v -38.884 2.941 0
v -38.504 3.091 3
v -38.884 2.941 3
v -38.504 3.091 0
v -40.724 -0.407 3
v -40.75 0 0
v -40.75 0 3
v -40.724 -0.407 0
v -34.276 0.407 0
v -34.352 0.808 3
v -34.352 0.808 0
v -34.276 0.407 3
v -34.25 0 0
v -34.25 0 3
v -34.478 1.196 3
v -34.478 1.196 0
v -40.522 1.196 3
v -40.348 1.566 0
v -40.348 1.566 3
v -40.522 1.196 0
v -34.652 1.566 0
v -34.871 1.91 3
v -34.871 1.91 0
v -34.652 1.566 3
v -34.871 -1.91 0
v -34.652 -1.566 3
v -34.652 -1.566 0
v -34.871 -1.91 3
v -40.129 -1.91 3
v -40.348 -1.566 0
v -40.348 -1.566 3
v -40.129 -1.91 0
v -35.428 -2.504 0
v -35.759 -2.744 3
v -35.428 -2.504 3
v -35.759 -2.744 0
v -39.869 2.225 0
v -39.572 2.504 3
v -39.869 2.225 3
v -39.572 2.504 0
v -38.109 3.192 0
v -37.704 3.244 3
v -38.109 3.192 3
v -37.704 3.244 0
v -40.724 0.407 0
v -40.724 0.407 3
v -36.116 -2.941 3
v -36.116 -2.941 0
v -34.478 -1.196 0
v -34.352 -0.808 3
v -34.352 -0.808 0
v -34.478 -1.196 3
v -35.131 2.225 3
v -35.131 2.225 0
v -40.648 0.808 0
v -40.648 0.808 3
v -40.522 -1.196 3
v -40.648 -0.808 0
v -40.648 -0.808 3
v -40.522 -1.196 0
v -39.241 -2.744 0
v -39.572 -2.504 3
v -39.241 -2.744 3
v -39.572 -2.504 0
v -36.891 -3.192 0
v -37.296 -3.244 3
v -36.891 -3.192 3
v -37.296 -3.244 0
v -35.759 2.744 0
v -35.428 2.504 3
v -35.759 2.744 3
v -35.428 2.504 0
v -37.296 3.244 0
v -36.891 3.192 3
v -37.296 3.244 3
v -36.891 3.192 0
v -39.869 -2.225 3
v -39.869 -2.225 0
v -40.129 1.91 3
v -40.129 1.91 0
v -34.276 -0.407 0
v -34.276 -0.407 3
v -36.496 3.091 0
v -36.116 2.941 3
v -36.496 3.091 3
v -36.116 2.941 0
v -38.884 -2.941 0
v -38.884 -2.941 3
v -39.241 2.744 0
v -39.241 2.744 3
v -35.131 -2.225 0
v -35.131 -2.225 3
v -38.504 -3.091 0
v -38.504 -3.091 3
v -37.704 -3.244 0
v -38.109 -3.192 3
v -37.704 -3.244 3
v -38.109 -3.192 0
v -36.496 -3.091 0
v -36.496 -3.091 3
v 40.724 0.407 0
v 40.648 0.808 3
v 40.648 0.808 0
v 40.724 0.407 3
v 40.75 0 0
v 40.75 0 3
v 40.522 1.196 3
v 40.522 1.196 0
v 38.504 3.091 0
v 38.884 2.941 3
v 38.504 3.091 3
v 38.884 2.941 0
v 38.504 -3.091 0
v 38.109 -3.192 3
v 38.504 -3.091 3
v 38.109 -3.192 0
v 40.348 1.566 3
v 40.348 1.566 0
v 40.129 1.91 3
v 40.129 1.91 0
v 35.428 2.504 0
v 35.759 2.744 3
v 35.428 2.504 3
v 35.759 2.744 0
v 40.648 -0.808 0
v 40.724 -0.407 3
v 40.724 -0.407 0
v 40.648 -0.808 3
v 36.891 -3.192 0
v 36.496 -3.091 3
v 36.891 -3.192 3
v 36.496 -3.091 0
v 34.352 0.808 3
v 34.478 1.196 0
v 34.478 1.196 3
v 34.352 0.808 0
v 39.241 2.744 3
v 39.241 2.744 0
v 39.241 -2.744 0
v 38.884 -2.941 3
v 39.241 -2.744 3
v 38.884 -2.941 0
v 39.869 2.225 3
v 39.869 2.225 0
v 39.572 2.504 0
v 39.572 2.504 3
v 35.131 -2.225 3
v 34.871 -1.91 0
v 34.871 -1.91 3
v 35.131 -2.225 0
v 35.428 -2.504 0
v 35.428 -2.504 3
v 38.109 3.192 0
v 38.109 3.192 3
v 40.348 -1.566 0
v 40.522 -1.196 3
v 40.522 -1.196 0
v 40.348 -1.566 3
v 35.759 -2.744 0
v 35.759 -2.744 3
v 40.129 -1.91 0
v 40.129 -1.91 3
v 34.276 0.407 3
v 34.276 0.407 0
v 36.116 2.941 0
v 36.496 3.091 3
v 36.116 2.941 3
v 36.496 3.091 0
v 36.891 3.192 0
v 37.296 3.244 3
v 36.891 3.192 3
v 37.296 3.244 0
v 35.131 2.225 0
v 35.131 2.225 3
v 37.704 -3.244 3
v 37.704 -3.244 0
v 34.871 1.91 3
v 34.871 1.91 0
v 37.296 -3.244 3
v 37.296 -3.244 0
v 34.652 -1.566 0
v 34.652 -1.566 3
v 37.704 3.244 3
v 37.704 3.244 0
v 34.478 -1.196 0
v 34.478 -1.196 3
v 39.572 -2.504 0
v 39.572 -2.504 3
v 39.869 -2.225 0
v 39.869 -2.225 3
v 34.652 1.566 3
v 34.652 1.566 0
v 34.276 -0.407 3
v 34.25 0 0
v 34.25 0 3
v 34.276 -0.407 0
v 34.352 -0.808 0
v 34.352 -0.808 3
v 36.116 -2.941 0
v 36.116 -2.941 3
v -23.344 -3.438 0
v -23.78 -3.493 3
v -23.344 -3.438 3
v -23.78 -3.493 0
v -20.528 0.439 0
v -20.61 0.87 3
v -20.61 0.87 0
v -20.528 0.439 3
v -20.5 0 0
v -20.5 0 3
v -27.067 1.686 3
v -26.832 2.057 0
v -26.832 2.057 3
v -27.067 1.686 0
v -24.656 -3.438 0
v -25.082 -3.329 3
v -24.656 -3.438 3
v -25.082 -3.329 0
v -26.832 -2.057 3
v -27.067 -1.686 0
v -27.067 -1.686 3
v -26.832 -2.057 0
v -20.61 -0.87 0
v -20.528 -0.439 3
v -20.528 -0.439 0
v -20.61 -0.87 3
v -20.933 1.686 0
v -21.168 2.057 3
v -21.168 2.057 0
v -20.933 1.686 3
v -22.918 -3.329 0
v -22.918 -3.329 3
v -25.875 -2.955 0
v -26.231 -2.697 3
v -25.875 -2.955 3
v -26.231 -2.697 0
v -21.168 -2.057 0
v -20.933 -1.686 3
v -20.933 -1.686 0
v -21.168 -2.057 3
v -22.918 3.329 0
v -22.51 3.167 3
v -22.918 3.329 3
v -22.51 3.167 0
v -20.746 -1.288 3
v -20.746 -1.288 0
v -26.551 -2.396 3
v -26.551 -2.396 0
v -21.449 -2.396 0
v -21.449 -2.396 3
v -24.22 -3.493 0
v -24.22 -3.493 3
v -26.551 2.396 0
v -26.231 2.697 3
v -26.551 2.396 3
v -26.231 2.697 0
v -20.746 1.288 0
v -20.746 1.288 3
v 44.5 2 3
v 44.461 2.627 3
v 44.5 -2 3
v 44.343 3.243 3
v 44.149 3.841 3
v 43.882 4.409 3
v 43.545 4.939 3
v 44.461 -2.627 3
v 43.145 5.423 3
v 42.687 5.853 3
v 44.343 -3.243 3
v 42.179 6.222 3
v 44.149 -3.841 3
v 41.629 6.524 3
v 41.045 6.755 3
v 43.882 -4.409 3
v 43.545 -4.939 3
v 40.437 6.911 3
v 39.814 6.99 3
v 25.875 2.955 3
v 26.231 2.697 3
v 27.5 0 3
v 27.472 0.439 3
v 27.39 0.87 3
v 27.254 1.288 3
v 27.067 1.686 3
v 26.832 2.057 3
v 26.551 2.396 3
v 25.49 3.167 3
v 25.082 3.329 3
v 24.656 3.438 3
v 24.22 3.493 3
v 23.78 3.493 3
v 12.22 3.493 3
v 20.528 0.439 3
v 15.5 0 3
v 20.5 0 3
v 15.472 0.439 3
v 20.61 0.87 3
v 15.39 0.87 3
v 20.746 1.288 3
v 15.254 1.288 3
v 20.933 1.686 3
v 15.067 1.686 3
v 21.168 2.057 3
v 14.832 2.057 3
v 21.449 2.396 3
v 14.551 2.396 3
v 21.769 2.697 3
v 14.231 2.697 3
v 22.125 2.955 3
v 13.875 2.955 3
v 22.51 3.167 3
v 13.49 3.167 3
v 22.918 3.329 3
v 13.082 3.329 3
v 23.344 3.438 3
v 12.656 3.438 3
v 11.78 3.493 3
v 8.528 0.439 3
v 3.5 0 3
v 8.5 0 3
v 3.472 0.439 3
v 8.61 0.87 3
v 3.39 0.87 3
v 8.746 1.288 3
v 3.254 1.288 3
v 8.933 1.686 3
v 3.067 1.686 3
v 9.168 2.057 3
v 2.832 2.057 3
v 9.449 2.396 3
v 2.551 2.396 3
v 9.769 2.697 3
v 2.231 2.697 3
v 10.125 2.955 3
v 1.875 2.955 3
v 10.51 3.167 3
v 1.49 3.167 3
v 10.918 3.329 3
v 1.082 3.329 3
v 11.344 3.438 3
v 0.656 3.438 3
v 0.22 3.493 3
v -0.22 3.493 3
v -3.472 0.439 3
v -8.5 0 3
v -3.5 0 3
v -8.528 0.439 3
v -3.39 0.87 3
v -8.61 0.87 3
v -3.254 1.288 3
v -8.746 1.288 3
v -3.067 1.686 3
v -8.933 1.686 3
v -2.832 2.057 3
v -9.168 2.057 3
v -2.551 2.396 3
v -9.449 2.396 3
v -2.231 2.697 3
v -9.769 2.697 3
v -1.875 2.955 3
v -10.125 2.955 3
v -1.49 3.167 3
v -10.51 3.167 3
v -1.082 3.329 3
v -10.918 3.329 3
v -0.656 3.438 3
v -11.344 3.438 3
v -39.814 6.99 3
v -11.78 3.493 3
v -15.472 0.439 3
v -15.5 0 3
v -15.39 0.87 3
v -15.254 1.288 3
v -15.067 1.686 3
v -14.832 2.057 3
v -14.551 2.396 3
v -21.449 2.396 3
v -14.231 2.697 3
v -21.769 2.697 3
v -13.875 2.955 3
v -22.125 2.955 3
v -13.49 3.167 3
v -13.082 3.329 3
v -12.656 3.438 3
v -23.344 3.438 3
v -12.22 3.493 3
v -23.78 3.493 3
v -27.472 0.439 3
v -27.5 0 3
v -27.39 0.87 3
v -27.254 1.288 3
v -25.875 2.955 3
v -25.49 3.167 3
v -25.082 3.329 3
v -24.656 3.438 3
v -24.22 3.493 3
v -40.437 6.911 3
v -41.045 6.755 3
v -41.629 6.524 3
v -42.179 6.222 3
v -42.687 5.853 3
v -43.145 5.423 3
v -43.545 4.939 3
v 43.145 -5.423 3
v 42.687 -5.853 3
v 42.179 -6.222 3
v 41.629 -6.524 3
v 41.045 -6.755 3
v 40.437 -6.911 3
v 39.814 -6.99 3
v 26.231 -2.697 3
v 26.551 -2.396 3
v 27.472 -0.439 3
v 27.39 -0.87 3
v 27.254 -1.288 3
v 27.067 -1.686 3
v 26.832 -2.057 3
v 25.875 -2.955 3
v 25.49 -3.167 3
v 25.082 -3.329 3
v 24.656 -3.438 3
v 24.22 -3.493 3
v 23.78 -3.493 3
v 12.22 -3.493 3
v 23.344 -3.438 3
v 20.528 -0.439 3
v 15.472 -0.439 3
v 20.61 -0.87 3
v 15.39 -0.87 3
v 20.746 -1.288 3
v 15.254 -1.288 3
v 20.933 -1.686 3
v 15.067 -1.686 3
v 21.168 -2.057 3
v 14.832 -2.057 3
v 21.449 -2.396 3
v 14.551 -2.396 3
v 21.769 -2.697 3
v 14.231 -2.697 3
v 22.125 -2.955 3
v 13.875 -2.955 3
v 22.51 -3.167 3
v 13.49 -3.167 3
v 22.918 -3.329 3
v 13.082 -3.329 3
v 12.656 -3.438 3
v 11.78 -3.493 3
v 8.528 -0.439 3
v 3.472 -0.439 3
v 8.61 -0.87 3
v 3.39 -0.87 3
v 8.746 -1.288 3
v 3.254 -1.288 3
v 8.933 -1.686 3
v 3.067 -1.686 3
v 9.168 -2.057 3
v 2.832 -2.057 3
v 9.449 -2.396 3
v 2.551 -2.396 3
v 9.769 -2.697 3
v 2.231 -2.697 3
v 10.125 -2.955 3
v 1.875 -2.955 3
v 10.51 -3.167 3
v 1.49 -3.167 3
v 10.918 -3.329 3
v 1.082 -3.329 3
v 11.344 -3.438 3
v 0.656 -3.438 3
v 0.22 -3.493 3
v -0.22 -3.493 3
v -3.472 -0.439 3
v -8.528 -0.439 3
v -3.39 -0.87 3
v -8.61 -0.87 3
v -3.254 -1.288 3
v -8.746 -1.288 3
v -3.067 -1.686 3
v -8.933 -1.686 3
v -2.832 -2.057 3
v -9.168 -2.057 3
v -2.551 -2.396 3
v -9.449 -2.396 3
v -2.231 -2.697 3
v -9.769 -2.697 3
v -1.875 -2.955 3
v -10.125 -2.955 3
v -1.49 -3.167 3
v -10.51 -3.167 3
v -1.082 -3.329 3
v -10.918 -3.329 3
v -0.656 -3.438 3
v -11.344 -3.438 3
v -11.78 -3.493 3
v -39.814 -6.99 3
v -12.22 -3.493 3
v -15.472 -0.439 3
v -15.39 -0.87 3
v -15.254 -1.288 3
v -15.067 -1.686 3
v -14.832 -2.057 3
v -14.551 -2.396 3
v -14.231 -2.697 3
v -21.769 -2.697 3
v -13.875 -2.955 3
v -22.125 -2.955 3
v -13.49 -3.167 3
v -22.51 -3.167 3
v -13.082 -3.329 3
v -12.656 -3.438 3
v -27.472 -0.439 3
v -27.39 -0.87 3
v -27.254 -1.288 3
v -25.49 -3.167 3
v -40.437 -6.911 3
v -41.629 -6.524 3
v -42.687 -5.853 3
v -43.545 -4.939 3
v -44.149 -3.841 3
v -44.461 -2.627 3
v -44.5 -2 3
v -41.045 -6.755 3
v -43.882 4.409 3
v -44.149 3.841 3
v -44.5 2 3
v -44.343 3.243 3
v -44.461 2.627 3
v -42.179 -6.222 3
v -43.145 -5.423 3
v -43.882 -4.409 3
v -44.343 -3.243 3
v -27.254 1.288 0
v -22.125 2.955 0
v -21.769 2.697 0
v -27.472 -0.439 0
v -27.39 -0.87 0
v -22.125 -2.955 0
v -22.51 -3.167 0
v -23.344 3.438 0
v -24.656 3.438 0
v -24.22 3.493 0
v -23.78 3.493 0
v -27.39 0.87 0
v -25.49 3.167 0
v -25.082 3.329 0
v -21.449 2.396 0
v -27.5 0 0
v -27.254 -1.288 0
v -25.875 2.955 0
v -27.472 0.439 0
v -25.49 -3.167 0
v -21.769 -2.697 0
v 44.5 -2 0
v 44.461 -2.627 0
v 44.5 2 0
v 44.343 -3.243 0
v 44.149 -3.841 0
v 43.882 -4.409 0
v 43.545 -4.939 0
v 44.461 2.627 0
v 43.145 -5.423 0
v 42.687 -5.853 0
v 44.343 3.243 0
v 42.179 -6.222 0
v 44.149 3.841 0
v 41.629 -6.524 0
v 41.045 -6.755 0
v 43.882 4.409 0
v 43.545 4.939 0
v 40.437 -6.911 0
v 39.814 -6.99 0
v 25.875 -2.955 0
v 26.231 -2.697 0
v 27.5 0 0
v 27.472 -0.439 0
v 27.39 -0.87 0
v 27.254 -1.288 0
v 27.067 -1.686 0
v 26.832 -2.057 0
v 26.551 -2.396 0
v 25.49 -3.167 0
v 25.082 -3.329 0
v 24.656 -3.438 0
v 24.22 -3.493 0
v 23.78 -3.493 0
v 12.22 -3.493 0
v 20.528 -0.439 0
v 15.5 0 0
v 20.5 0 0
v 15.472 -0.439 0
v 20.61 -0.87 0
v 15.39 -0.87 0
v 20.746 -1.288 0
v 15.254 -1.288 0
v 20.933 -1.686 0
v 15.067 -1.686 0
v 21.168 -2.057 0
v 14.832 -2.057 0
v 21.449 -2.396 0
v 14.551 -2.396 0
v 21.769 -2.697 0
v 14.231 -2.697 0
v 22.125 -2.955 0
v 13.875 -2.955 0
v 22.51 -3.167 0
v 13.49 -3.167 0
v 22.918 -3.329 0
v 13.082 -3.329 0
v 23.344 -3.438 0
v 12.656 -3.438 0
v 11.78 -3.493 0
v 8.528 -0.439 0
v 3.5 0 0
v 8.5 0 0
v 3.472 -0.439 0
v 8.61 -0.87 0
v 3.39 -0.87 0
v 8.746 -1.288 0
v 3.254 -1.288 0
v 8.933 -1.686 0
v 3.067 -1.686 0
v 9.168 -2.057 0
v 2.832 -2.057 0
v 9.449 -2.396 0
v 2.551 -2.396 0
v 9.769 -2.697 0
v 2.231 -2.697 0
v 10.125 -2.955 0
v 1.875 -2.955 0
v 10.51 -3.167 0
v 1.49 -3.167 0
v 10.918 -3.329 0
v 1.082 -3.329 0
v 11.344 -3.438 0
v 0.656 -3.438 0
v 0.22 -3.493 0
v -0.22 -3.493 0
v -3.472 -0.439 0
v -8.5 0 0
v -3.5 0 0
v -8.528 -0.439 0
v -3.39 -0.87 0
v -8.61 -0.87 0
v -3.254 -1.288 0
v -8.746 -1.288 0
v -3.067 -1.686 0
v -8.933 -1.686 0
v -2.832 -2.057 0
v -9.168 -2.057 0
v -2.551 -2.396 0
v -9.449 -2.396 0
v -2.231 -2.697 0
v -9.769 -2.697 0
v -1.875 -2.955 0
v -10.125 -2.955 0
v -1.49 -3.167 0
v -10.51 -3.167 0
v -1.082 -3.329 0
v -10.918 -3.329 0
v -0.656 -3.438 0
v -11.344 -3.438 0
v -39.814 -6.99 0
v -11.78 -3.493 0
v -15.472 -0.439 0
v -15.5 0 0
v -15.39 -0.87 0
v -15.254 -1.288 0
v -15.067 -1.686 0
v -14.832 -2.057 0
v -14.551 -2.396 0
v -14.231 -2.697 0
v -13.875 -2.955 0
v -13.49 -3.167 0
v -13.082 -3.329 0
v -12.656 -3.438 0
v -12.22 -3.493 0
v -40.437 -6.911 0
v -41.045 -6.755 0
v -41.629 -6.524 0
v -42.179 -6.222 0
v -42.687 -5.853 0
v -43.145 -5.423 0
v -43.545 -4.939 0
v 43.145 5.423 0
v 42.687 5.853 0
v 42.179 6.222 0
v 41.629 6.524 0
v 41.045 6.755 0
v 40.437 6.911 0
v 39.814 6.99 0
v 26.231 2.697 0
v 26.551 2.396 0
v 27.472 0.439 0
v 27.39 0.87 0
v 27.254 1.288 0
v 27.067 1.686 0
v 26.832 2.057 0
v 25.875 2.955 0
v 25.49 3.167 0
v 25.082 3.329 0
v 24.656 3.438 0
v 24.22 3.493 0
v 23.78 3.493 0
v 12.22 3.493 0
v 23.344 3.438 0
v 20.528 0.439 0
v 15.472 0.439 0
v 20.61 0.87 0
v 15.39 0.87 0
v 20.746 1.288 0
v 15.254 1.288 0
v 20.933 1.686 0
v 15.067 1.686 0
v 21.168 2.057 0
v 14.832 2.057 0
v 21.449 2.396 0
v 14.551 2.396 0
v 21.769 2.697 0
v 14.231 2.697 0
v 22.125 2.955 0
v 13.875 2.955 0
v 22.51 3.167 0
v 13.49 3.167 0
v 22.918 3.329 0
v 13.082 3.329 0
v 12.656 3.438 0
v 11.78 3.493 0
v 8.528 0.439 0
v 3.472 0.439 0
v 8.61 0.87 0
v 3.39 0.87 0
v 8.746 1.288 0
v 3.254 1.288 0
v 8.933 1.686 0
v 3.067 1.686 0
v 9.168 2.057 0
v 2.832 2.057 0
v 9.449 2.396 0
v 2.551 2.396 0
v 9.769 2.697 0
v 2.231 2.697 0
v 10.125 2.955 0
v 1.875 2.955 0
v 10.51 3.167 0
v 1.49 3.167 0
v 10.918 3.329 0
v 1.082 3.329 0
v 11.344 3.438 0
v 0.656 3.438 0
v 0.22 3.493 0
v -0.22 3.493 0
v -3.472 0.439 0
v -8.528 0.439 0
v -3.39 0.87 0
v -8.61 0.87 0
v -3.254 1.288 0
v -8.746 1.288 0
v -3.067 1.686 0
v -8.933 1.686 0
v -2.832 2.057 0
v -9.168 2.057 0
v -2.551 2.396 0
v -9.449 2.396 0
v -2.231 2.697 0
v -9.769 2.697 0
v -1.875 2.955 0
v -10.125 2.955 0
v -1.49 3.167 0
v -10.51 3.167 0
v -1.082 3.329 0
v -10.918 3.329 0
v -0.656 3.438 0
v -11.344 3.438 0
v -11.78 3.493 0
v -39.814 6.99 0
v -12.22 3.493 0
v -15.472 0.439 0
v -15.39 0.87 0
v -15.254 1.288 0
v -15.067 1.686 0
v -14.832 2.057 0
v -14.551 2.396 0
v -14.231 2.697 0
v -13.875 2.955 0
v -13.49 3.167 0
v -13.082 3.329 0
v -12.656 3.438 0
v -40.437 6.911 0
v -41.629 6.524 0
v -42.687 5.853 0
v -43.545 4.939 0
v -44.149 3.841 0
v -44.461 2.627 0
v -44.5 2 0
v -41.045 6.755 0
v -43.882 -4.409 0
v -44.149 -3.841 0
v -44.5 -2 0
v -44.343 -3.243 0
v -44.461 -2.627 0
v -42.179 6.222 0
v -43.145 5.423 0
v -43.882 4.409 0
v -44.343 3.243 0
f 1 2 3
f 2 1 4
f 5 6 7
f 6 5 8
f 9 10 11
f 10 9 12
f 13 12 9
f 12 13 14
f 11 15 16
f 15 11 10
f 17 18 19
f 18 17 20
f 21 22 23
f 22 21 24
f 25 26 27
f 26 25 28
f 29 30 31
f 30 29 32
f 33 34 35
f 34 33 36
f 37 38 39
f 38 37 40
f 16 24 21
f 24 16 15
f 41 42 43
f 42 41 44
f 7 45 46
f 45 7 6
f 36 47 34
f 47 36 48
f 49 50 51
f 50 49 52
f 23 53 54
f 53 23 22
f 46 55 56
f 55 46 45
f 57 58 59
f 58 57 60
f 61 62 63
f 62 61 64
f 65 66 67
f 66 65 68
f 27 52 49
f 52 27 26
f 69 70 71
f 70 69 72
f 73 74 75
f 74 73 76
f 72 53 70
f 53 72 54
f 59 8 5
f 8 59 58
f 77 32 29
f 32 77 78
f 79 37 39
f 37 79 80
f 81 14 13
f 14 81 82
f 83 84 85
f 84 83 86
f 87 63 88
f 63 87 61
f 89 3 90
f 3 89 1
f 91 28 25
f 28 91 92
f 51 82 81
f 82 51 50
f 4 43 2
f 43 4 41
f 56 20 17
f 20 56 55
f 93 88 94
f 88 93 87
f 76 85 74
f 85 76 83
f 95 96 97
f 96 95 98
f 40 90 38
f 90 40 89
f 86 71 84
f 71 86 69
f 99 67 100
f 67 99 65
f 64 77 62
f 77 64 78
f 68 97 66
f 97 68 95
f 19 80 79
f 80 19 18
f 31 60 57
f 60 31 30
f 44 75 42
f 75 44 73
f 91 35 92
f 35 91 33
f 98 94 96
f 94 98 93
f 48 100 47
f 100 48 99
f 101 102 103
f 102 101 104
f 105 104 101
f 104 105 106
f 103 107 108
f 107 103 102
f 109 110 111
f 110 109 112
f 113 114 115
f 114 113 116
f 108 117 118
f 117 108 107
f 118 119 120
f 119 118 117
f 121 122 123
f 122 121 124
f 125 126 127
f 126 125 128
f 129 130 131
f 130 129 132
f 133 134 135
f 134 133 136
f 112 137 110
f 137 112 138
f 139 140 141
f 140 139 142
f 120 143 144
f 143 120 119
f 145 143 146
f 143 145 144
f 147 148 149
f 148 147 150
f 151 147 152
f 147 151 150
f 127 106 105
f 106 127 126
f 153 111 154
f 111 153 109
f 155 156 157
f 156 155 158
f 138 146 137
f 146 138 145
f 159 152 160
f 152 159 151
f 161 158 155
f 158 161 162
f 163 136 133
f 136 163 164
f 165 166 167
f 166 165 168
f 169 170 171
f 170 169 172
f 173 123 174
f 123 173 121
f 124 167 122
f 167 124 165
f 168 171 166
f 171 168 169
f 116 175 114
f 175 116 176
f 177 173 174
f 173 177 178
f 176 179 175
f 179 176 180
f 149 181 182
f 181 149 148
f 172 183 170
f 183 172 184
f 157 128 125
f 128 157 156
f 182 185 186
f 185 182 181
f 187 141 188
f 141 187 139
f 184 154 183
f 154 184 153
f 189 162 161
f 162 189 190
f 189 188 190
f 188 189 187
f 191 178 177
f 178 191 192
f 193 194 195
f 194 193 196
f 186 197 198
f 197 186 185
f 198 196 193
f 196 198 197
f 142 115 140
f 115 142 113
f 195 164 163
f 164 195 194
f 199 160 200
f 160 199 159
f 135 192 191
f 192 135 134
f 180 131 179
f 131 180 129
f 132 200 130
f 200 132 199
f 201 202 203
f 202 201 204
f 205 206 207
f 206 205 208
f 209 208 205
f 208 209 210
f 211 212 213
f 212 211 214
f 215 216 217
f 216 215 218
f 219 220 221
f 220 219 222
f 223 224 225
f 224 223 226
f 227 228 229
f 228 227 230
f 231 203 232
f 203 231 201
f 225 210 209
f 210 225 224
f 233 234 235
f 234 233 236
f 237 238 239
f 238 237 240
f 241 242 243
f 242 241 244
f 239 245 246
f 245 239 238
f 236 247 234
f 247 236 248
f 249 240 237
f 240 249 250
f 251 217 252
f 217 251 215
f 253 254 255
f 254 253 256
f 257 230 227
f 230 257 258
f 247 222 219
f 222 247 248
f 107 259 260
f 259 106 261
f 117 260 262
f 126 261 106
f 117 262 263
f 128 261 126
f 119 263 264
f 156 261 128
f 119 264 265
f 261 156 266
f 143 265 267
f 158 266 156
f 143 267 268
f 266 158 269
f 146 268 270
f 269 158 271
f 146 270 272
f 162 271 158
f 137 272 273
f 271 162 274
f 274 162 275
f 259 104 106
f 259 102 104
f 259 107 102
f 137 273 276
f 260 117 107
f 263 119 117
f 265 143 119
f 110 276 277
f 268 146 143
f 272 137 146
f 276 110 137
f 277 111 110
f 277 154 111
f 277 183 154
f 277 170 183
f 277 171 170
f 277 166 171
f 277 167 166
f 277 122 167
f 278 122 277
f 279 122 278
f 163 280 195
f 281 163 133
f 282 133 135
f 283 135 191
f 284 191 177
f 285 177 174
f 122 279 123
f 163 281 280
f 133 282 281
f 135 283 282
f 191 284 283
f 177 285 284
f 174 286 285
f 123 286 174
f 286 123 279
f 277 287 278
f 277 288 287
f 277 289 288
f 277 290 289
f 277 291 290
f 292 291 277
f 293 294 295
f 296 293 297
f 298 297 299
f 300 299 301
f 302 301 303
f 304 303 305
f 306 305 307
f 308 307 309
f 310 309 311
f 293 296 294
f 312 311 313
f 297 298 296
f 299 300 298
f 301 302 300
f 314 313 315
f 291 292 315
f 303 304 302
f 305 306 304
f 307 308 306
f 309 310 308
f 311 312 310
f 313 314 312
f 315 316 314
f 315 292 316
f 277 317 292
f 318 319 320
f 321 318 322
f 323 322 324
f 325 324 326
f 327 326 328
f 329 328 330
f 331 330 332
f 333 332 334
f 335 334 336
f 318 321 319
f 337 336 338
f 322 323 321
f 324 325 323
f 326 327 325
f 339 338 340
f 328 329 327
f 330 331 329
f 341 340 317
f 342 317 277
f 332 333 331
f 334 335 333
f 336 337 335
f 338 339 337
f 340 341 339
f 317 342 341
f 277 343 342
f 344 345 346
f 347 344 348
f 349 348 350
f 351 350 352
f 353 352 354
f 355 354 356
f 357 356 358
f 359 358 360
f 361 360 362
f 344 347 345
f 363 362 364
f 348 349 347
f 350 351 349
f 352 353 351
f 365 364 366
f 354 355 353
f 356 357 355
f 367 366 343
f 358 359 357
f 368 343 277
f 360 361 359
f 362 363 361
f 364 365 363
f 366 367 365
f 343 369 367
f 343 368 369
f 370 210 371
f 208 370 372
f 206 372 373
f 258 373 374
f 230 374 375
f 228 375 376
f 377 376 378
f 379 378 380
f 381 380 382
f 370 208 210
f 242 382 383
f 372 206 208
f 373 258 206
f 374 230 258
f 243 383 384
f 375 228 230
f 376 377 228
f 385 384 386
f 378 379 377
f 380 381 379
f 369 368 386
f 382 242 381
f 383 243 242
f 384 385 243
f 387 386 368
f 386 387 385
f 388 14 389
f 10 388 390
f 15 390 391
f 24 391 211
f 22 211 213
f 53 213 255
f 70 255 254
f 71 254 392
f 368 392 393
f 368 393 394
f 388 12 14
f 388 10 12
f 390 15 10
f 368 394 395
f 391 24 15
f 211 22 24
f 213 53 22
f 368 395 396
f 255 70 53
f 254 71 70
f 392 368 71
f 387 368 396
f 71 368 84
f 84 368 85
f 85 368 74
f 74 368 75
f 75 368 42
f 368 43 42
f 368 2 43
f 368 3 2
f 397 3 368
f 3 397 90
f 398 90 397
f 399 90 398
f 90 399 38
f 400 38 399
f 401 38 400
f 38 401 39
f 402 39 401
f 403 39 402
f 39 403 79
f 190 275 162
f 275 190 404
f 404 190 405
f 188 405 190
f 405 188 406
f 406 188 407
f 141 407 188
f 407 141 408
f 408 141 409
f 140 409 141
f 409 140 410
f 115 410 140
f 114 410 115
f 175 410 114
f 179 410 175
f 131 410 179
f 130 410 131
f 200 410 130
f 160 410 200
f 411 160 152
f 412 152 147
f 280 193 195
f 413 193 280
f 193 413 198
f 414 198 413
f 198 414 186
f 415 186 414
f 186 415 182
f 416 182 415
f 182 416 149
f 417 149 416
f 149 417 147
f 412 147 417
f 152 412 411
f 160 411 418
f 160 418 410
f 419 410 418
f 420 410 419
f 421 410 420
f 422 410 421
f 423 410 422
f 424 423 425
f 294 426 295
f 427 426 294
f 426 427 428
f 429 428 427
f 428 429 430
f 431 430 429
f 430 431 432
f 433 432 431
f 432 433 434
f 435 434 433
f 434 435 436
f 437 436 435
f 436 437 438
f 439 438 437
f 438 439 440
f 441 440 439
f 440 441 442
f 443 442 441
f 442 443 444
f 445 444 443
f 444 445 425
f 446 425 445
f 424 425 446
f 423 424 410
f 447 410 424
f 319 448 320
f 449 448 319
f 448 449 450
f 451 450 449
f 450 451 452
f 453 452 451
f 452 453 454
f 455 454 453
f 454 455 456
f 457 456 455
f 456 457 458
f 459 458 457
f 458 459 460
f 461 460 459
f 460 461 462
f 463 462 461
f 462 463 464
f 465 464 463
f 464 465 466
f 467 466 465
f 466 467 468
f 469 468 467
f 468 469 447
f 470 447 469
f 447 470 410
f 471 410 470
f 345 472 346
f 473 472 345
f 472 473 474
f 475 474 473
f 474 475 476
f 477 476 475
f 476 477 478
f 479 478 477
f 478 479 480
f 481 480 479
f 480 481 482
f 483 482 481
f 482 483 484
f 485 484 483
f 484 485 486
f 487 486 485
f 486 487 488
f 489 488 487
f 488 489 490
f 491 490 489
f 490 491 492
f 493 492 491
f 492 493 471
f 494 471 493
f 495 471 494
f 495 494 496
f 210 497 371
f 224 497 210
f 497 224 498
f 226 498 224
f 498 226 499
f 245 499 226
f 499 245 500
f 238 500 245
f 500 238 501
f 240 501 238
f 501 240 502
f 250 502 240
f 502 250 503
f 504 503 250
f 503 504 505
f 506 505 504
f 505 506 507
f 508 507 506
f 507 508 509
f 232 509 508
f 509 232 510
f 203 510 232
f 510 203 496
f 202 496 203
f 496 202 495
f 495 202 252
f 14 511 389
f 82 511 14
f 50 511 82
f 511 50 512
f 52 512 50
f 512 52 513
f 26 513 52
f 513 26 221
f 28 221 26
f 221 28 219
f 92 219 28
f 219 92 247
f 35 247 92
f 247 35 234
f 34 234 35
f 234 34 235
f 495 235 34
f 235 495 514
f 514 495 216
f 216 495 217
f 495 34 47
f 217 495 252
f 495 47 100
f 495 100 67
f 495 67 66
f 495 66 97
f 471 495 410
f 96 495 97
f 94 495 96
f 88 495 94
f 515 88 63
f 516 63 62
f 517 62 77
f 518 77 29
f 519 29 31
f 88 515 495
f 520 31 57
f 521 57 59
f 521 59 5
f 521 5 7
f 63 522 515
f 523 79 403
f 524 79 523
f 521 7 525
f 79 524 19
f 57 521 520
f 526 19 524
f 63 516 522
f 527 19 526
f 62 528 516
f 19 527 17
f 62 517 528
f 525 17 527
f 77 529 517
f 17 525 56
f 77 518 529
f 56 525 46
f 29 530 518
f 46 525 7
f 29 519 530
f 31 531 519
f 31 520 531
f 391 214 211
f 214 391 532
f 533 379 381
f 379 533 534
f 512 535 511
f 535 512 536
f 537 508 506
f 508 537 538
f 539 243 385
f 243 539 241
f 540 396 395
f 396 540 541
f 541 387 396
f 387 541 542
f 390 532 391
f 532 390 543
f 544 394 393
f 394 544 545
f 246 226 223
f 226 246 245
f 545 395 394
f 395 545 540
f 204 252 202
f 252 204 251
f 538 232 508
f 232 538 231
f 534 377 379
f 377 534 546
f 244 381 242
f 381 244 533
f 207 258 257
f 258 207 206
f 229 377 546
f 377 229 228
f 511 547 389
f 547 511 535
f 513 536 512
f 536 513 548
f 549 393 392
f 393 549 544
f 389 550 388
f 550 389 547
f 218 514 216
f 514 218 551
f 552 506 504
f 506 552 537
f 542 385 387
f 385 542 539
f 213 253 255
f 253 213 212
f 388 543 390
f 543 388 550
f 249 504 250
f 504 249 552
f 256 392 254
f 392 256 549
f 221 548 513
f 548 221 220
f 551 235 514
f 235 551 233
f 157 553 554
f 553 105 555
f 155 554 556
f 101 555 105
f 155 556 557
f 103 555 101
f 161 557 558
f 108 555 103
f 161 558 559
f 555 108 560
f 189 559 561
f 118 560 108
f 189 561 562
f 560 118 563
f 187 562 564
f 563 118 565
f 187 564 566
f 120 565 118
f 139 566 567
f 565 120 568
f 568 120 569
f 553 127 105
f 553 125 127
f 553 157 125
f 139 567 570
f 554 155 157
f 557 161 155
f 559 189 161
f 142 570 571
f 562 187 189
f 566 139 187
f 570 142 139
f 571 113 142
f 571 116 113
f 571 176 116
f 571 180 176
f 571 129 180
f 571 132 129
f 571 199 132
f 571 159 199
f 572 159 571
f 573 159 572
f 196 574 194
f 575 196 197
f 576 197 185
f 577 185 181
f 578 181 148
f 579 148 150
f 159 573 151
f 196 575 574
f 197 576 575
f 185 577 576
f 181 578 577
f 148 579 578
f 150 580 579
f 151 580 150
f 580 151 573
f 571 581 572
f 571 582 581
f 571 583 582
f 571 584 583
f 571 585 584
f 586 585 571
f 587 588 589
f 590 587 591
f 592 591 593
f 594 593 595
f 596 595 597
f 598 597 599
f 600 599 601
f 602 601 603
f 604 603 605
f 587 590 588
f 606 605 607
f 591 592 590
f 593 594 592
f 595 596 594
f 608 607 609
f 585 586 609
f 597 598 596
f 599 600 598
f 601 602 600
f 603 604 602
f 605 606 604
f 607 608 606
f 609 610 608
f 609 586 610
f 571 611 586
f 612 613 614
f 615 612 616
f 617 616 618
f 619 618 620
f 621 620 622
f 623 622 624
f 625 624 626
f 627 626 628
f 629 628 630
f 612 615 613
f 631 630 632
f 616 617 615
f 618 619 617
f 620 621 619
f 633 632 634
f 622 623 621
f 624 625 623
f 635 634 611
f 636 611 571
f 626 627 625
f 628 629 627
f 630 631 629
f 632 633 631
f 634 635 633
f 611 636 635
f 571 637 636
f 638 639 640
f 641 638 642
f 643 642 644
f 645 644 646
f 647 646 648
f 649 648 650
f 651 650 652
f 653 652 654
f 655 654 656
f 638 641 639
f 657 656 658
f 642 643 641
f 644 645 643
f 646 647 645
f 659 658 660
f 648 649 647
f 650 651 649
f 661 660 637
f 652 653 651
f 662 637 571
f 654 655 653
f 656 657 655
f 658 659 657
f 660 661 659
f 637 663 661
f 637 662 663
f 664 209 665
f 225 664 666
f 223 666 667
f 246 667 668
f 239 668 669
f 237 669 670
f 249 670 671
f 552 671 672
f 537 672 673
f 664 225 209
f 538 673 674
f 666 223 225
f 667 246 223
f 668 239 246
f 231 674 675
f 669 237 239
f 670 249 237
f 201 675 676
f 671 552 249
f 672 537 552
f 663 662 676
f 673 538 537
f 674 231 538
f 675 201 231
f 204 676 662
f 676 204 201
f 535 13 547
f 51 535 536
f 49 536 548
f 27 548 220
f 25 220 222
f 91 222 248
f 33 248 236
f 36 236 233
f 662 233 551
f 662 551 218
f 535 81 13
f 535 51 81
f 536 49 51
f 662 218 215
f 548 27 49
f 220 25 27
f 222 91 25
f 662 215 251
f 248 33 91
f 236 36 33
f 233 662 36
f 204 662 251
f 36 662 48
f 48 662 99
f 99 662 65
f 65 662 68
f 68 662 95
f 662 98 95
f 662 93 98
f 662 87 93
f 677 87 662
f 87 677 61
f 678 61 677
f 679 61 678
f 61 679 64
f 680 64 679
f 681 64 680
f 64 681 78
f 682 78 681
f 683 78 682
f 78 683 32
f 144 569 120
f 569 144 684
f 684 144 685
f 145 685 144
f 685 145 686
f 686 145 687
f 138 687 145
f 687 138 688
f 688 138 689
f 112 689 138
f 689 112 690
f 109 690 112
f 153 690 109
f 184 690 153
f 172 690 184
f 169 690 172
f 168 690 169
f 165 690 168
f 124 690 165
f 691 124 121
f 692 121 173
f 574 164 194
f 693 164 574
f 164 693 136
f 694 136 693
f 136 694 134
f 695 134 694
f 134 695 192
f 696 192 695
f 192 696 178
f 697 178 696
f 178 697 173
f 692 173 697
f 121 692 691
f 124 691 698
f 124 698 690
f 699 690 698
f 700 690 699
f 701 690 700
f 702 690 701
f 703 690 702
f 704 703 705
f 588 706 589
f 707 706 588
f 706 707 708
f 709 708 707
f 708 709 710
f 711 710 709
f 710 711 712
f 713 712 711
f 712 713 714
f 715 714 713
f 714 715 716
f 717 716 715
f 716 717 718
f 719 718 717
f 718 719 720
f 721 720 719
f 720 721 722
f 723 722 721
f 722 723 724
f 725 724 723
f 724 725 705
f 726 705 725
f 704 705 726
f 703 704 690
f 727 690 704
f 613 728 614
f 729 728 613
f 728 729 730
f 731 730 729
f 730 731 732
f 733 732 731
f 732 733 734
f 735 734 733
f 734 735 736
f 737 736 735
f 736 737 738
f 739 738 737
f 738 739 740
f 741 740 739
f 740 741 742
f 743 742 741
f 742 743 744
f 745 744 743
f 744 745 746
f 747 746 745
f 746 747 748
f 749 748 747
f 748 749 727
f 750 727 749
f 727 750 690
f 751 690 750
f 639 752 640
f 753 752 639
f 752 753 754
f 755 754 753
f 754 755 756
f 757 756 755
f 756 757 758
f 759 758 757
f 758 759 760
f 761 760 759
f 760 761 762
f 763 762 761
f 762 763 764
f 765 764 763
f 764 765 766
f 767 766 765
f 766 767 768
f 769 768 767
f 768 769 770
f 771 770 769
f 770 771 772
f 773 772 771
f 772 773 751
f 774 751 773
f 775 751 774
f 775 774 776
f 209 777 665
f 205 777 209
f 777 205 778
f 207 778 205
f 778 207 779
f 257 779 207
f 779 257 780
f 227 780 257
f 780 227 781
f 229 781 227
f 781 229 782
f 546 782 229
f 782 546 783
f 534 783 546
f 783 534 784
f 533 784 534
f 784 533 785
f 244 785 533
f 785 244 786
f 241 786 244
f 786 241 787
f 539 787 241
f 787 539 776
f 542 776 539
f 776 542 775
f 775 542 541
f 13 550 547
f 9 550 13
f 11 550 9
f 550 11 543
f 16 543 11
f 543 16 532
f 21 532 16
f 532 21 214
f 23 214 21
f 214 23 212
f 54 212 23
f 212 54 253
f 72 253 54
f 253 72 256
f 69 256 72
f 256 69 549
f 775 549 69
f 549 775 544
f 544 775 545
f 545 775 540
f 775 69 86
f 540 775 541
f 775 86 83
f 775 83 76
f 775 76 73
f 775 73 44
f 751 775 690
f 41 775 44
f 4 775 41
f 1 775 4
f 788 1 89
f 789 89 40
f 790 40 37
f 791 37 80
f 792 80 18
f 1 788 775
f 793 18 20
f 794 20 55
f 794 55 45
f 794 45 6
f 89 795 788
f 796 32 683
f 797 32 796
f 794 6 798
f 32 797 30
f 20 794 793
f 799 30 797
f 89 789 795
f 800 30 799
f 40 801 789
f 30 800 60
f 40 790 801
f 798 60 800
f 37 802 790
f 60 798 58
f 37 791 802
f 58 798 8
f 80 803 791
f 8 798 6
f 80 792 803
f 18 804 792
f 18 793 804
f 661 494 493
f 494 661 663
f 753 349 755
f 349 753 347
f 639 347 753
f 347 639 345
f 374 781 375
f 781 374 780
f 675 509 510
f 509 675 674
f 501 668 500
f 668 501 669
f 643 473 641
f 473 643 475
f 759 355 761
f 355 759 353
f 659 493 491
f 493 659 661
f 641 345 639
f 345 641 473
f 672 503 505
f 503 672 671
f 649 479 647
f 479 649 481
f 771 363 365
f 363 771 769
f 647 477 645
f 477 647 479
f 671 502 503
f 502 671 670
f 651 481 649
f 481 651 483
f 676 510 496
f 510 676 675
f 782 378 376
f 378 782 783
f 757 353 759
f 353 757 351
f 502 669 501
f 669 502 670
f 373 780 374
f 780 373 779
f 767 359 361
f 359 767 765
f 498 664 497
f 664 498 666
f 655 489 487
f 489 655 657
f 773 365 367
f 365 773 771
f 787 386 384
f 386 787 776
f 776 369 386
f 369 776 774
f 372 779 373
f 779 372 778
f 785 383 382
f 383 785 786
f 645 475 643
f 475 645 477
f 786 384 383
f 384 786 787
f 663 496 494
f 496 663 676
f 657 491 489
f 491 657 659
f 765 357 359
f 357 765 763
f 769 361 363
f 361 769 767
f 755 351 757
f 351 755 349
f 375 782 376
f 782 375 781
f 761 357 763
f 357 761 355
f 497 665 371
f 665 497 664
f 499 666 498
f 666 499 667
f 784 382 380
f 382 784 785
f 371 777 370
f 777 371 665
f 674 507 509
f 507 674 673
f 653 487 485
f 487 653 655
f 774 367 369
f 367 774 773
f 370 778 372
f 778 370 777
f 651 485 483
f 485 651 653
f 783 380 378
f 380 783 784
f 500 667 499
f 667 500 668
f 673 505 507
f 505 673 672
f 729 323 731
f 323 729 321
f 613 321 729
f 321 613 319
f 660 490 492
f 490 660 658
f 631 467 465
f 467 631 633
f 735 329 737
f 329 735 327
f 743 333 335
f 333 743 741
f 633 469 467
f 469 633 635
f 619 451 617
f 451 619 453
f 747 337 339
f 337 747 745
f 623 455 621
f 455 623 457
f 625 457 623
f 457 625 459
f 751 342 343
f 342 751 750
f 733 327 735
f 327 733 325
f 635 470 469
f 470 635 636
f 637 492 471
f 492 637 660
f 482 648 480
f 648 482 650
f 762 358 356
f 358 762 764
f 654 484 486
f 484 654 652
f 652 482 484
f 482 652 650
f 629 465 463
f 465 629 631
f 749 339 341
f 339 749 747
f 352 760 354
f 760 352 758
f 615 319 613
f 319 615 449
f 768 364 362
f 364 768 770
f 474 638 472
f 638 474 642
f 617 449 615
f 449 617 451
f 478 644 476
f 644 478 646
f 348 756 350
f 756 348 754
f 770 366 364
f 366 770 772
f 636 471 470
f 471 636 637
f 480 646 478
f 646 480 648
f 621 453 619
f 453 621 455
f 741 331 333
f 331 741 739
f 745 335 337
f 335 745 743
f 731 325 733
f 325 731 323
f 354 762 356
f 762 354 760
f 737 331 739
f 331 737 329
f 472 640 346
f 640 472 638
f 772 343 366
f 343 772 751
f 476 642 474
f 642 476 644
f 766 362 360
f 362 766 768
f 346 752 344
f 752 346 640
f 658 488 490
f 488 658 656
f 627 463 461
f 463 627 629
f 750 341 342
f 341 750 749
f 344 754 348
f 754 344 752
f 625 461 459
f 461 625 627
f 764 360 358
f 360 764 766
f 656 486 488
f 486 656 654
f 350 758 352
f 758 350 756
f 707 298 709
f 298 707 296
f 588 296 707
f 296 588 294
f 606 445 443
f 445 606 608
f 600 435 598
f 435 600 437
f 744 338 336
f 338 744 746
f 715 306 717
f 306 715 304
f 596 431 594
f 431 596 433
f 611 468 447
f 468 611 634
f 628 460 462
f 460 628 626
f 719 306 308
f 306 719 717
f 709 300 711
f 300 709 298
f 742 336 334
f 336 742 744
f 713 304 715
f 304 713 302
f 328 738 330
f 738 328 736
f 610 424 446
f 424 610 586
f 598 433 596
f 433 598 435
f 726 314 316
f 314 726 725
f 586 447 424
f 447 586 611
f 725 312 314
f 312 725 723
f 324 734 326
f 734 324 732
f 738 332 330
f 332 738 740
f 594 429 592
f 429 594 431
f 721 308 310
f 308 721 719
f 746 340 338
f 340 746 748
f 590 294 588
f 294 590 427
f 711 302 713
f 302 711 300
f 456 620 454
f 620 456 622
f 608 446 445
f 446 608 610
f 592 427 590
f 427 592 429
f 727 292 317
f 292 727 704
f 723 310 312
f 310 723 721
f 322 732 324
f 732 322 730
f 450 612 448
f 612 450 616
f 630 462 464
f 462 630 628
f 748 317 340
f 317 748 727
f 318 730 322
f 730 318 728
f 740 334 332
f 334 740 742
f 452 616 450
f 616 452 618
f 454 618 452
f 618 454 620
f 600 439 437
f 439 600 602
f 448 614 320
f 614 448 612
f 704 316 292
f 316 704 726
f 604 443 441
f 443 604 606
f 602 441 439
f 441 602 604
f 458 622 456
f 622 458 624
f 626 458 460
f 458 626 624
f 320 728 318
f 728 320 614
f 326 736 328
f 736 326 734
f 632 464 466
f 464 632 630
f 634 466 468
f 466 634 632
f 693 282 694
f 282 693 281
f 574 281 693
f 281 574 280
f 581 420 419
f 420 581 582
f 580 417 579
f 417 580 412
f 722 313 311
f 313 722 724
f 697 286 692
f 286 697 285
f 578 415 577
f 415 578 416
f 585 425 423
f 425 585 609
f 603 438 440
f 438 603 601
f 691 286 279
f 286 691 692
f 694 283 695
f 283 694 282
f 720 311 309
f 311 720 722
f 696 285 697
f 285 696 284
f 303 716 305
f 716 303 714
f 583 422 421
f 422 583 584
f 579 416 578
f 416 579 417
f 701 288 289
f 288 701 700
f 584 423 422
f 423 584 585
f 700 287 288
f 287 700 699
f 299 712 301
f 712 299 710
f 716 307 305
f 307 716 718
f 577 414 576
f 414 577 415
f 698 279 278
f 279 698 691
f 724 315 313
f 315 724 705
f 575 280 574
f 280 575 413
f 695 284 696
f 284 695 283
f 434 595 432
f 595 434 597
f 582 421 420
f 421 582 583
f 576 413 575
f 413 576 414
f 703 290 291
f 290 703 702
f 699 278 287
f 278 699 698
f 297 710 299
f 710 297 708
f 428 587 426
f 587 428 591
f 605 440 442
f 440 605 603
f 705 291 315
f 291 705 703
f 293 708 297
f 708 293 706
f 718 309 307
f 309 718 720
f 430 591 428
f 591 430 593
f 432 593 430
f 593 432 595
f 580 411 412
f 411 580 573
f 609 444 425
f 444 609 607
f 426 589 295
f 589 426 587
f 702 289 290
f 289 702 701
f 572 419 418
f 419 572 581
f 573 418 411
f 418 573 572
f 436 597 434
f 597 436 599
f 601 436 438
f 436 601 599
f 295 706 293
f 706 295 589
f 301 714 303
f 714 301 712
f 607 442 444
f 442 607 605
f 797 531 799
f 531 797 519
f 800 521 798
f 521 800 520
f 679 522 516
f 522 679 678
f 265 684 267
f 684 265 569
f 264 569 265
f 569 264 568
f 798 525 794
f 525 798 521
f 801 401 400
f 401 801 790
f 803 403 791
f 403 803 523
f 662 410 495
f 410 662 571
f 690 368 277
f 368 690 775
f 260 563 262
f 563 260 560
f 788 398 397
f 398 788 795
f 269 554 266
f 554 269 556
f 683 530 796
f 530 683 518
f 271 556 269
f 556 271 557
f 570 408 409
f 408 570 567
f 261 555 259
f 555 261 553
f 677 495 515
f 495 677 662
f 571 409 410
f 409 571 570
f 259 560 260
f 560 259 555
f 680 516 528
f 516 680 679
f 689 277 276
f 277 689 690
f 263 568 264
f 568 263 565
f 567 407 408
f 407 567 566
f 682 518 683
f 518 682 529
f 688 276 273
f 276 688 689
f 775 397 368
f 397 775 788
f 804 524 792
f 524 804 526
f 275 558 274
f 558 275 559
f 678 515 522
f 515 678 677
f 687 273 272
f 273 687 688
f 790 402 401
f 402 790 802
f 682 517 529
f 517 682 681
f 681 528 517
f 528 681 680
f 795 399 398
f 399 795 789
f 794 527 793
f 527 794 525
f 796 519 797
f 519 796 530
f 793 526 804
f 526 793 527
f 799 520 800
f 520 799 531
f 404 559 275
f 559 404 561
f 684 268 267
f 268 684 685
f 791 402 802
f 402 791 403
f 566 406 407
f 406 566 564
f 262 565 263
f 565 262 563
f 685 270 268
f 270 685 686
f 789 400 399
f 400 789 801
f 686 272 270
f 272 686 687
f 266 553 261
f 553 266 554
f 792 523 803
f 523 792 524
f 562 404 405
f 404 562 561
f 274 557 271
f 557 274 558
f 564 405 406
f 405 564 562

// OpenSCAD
$fn = 50;


difference() {
	union() {
		hull() {
			translate(v = [-39.5000000000, 2.0000000000, 0]) {
				cylinder(h = 3, r = 5);
			}
			translate(v = [39.5000000000, 2.0000000000, 0]) {
				cylinder(h = 3, r = 5);
			}
			translate(v = [-39.5000000000, -2.0000000000, 0]) {
				cylinder(h = 3, r = 5);
			}
			translate(v = [39.5000000000, -2.0000000000, 0]) {
				cylinder(h = 3, r = 5);
			}
		}
	}
	union() {
		#translate(v = [-37.5000000000, 0.0000000000, 0]) {
			cylinder(h = 3, r = 3.2500000000);
		}
		#translate(v = [37.5000000000, 0.0000000000, 0]) {
			cylinder(h = 3, r = 3.2500000000);
		}
		#translate(v = [-37.5000000000, 0.0000000000, -100.0000000000]) {
			cylinder(h = 200, r = 3.2500000000);
		}
		#translate(v = [-37.5000000000, 0.0000000000, -100.0000000000]) {
			cylinder(h = 200, r = 3.2500000000);
		}
		#translate(v = [37.5000000000, 0.0000000000, -100.0000000000]) {
			cylinder(h = 200, r = 3.2500000000);
		}
		#translate(v = [37.5000000000, 0.0000000000, -100.0000000000]) {
			cylinder(h = 200, r = 3.2500000000);
		}
		#translate(v = [-37.5000000000, 0.0000000000, 0]) {
			cylinder(h = 3, r = 1.8000000000);
		}
		#translate(v = [37.5000000000, 0.0000000000, 0]) {
			cylinder(h = 3, r = 1.8000000000);
		}
		#translate(v = [-37.5000000000, 0.0000000000, 0]) {
			cylinder(h = 3, r = 1.8000000000);
		}
		#translate(v = [37.5000000000, 0.0000000000, 0]) {
			cylinder(h = 3, r = 1.8000000000);
		}
		#translate(v = [-37.5000000000, 0.0000000000, 0]) {
			cylinder(h = 3, r = 1.8000000000);
		}
		#translate(v = [37.5000000000, 0.0000000000, 0]) {
			cylinder(h = 3, r = 1.8000000000);
		}
		#translate(v = [-24.0000000000, 0, 0]) {
			cylinder(h = 3, r = 3.5000000000);
		}
		#translate(v = [-12.0000000000, 0, 0]) {
			cylinder(h = 3, r = 3.5000000000);
		}
		#cylinder(h = 3, r = 3.5000000000);
		#translate(v = [12.0000000000, 0, 0]) {
			cylinder(h = 3, r = 3.5000000000);
		}
		#translate(v = [24.0000000000, 0, 0]) {
			cylinder(h = 3, r = 3.5000000000);
		}
	}
}
